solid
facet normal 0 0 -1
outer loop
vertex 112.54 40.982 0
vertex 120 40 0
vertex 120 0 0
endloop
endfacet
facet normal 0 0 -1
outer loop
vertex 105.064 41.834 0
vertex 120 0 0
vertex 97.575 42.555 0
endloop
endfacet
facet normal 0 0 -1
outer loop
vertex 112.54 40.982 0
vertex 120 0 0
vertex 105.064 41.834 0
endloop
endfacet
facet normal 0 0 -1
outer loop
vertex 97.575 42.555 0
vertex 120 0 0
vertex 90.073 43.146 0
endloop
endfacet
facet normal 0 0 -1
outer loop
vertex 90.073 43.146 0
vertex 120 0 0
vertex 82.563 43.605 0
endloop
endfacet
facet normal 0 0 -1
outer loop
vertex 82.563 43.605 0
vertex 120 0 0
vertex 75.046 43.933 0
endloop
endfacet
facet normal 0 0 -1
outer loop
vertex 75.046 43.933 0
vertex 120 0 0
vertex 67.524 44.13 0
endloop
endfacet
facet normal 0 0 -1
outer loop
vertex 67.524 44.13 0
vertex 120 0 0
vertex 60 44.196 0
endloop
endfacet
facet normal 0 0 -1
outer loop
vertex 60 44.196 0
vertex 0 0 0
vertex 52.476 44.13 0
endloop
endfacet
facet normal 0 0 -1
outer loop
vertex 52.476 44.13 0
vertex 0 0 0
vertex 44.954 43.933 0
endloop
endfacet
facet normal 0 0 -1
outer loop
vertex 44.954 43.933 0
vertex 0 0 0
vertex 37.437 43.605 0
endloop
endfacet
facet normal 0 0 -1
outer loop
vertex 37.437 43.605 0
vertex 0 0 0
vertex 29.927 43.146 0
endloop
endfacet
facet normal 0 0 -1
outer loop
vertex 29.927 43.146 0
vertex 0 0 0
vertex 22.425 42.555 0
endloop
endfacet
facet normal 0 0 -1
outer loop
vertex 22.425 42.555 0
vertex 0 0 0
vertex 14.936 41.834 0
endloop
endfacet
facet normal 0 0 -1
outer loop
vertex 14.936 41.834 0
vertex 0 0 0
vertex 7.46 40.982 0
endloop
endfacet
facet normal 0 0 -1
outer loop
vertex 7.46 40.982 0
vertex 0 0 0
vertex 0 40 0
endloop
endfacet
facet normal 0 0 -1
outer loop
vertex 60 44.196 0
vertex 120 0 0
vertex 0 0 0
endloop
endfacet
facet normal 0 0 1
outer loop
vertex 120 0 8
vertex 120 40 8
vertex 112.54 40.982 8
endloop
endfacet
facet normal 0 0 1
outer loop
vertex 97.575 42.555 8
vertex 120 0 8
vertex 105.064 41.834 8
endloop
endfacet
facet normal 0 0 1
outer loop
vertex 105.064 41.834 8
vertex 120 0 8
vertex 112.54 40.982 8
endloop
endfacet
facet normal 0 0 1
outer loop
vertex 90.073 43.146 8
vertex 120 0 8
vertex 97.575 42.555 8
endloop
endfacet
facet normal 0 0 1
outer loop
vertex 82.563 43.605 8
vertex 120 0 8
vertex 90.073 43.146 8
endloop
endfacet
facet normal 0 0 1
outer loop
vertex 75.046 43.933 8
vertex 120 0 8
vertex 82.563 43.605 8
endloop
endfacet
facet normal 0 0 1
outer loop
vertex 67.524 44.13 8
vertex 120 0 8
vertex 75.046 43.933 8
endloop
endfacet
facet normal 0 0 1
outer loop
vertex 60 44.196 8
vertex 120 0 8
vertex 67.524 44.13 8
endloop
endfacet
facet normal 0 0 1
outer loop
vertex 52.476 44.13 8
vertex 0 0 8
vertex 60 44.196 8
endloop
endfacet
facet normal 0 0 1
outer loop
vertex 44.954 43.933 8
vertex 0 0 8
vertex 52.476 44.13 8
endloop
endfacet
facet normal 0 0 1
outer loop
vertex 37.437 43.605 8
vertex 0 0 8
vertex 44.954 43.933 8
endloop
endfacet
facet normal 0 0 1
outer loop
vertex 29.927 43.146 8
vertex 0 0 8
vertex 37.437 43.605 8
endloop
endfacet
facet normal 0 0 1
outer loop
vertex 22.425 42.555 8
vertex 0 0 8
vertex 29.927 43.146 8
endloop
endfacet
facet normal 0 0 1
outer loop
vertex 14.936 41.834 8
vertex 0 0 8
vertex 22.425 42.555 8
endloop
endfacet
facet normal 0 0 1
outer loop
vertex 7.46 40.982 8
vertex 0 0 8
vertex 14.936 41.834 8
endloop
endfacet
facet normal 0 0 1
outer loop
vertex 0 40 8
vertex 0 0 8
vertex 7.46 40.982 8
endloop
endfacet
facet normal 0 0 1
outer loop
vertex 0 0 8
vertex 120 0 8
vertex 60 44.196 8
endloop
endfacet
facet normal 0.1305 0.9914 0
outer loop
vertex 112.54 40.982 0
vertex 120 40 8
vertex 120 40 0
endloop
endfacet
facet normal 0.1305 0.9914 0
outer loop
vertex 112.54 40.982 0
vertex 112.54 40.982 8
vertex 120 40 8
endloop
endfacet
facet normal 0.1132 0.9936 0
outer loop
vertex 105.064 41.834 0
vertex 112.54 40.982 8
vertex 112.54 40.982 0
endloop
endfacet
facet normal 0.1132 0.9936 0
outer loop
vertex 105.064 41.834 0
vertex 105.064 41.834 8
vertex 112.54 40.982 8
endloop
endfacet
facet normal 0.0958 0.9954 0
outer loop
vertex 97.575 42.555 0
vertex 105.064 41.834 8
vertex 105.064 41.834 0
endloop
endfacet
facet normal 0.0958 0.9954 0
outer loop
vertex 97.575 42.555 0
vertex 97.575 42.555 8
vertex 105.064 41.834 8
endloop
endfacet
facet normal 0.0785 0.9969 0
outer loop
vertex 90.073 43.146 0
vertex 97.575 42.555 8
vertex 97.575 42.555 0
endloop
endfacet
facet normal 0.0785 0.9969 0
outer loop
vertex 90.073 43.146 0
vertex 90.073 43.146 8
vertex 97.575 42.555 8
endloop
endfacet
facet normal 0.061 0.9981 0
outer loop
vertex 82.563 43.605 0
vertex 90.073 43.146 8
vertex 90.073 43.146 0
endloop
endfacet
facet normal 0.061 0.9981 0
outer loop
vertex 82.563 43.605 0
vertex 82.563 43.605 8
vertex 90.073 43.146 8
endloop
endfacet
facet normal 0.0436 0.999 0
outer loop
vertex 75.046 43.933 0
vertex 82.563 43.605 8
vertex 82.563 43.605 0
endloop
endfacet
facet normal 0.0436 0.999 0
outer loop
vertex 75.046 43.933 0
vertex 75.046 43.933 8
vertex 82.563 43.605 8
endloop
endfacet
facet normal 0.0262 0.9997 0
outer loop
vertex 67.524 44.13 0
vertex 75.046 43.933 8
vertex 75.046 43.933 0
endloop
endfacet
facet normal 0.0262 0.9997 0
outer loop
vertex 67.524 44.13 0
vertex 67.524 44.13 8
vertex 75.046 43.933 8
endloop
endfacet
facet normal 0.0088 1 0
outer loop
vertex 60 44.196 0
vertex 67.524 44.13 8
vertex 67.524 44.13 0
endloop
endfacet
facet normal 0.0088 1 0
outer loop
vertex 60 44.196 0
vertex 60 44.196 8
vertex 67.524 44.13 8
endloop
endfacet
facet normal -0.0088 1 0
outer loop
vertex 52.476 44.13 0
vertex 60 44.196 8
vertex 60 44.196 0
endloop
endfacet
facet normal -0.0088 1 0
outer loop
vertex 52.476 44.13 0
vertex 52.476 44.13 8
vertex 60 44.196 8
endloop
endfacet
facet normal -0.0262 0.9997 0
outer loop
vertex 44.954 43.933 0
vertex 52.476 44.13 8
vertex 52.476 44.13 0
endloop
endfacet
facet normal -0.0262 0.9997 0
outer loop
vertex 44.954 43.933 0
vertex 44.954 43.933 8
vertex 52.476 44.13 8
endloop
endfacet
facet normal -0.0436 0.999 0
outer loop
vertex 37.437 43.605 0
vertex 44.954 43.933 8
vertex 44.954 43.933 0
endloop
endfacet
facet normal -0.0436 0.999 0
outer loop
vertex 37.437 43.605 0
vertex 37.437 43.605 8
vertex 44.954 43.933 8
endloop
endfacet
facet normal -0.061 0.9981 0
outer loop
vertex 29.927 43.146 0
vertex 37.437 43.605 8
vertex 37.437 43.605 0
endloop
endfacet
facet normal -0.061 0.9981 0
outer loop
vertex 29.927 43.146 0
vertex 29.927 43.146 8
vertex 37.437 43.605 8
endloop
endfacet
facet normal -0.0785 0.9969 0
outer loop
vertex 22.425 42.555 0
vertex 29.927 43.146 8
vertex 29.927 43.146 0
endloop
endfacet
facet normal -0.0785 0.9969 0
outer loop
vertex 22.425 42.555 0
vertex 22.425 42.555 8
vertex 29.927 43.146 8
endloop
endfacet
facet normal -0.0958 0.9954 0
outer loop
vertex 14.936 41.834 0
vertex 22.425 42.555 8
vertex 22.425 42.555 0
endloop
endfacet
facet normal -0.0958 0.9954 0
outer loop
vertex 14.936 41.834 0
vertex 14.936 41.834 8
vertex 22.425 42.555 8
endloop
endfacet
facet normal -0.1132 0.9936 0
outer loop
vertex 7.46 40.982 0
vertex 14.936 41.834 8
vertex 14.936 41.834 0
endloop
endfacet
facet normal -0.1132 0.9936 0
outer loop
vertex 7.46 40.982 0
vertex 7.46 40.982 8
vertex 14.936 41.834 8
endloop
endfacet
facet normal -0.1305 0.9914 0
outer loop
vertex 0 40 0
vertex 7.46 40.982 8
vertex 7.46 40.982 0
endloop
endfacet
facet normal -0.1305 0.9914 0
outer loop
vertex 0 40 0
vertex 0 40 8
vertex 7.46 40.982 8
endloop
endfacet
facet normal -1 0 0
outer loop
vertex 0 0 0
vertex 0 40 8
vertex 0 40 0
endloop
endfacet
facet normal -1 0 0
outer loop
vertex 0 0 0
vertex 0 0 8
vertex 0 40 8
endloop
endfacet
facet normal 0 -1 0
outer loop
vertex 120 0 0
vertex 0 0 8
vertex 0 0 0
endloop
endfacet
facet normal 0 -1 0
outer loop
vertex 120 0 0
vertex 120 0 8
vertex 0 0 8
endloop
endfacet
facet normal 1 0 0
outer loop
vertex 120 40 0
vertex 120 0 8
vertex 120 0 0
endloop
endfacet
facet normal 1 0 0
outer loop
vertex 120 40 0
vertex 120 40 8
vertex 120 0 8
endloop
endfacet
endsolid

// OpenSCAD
$fn = 32;

// ----------------------------------------------------------------------
// Arc profile plate: crown, 19 points
// ----------------------------------------------------------------------

// --- parameters (mm) ---
bar_l = 120;              // bar length, X
bar_w = 40;               // bar height at the ends, Y
arc_r = 431.12;           // radius of the crown arc
arc_angle = 16;           // crown arc angle, degrees
crown_rise = 4.2;         // rise of the crown over the ends
arc_step = 1;             // sampling step of the crown arc, degrees
plate_t = 8;              // plate thickness, Z

bbox_y = bar_w + crown_rise;  // full height with the crown

profile = [[120, 40], [112.54, 40.982], [105.064, 41.834], [97.575, 42.555], [90.073, 43.146], [82.563, 43.605], [75.046, 43.933], [67.524, 44.13], [60, 44.196], [52.476, 44.13], [44.954, 43.933], [37.437, 43.605], [29.927, 43.146], [22.425, 42.555], [14.936, 41.834], [7.46, 40.982], [0, 40], [0, 0], [120, 0]];  // primary outline, 19 points, counter clockwise

// --- the one profile operation ---
linear_extrude(height = plate_t) polygon(points = profile);
